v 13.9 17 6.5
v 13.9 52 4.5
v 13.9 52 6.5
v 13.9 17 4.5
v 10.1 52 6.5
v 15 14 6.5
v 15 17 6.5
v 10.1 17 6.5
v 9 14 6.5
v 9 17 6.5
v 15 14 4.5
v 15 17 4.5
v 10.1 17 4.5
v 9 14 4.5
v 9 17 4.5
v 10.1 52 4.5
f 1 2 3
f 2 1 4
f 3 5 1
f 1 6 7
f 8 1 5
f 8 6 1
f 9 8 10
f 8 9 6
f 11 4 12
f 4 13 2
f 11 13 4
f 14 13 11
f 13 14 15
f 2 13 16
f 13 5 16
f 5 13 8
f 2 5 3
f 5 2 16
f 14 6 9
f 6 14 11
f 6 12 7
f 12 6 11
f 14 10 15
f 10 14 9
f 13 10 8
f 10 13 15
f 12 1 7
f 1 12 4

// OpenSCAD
$fn = 25;
showLock = true;

if (!showLock) {
    M();
    translate([8, 42, 3]) Mount();
    translate([8, 18, 3]) Mount();
    translate([56, 42, 3]) Mount();
    translate([56, 18, 3]) Mount();
    // In place
    //translate([10.1, 14, 4.5]) #Lock();
} else {
    translate([10.1, 14, 4.5]) Lock();
}

module Lock() {
    cube([3.8, 38, 2]);
    translate([-1.1, 0, 0]) cube([6, 3, 2]);
}

module Mount() {
    difference() {
        cube([8, 4, 6]);
        translate([2, -1, 0]) cube([4, 10, 4]);
    }
}

module M() {
    scale([6, 5, 3]) {
        minkowski() {
            linear_extrude(1)
                text("M", font = "Calibri");
            sphere(r=0.35);
        }
    }
}
